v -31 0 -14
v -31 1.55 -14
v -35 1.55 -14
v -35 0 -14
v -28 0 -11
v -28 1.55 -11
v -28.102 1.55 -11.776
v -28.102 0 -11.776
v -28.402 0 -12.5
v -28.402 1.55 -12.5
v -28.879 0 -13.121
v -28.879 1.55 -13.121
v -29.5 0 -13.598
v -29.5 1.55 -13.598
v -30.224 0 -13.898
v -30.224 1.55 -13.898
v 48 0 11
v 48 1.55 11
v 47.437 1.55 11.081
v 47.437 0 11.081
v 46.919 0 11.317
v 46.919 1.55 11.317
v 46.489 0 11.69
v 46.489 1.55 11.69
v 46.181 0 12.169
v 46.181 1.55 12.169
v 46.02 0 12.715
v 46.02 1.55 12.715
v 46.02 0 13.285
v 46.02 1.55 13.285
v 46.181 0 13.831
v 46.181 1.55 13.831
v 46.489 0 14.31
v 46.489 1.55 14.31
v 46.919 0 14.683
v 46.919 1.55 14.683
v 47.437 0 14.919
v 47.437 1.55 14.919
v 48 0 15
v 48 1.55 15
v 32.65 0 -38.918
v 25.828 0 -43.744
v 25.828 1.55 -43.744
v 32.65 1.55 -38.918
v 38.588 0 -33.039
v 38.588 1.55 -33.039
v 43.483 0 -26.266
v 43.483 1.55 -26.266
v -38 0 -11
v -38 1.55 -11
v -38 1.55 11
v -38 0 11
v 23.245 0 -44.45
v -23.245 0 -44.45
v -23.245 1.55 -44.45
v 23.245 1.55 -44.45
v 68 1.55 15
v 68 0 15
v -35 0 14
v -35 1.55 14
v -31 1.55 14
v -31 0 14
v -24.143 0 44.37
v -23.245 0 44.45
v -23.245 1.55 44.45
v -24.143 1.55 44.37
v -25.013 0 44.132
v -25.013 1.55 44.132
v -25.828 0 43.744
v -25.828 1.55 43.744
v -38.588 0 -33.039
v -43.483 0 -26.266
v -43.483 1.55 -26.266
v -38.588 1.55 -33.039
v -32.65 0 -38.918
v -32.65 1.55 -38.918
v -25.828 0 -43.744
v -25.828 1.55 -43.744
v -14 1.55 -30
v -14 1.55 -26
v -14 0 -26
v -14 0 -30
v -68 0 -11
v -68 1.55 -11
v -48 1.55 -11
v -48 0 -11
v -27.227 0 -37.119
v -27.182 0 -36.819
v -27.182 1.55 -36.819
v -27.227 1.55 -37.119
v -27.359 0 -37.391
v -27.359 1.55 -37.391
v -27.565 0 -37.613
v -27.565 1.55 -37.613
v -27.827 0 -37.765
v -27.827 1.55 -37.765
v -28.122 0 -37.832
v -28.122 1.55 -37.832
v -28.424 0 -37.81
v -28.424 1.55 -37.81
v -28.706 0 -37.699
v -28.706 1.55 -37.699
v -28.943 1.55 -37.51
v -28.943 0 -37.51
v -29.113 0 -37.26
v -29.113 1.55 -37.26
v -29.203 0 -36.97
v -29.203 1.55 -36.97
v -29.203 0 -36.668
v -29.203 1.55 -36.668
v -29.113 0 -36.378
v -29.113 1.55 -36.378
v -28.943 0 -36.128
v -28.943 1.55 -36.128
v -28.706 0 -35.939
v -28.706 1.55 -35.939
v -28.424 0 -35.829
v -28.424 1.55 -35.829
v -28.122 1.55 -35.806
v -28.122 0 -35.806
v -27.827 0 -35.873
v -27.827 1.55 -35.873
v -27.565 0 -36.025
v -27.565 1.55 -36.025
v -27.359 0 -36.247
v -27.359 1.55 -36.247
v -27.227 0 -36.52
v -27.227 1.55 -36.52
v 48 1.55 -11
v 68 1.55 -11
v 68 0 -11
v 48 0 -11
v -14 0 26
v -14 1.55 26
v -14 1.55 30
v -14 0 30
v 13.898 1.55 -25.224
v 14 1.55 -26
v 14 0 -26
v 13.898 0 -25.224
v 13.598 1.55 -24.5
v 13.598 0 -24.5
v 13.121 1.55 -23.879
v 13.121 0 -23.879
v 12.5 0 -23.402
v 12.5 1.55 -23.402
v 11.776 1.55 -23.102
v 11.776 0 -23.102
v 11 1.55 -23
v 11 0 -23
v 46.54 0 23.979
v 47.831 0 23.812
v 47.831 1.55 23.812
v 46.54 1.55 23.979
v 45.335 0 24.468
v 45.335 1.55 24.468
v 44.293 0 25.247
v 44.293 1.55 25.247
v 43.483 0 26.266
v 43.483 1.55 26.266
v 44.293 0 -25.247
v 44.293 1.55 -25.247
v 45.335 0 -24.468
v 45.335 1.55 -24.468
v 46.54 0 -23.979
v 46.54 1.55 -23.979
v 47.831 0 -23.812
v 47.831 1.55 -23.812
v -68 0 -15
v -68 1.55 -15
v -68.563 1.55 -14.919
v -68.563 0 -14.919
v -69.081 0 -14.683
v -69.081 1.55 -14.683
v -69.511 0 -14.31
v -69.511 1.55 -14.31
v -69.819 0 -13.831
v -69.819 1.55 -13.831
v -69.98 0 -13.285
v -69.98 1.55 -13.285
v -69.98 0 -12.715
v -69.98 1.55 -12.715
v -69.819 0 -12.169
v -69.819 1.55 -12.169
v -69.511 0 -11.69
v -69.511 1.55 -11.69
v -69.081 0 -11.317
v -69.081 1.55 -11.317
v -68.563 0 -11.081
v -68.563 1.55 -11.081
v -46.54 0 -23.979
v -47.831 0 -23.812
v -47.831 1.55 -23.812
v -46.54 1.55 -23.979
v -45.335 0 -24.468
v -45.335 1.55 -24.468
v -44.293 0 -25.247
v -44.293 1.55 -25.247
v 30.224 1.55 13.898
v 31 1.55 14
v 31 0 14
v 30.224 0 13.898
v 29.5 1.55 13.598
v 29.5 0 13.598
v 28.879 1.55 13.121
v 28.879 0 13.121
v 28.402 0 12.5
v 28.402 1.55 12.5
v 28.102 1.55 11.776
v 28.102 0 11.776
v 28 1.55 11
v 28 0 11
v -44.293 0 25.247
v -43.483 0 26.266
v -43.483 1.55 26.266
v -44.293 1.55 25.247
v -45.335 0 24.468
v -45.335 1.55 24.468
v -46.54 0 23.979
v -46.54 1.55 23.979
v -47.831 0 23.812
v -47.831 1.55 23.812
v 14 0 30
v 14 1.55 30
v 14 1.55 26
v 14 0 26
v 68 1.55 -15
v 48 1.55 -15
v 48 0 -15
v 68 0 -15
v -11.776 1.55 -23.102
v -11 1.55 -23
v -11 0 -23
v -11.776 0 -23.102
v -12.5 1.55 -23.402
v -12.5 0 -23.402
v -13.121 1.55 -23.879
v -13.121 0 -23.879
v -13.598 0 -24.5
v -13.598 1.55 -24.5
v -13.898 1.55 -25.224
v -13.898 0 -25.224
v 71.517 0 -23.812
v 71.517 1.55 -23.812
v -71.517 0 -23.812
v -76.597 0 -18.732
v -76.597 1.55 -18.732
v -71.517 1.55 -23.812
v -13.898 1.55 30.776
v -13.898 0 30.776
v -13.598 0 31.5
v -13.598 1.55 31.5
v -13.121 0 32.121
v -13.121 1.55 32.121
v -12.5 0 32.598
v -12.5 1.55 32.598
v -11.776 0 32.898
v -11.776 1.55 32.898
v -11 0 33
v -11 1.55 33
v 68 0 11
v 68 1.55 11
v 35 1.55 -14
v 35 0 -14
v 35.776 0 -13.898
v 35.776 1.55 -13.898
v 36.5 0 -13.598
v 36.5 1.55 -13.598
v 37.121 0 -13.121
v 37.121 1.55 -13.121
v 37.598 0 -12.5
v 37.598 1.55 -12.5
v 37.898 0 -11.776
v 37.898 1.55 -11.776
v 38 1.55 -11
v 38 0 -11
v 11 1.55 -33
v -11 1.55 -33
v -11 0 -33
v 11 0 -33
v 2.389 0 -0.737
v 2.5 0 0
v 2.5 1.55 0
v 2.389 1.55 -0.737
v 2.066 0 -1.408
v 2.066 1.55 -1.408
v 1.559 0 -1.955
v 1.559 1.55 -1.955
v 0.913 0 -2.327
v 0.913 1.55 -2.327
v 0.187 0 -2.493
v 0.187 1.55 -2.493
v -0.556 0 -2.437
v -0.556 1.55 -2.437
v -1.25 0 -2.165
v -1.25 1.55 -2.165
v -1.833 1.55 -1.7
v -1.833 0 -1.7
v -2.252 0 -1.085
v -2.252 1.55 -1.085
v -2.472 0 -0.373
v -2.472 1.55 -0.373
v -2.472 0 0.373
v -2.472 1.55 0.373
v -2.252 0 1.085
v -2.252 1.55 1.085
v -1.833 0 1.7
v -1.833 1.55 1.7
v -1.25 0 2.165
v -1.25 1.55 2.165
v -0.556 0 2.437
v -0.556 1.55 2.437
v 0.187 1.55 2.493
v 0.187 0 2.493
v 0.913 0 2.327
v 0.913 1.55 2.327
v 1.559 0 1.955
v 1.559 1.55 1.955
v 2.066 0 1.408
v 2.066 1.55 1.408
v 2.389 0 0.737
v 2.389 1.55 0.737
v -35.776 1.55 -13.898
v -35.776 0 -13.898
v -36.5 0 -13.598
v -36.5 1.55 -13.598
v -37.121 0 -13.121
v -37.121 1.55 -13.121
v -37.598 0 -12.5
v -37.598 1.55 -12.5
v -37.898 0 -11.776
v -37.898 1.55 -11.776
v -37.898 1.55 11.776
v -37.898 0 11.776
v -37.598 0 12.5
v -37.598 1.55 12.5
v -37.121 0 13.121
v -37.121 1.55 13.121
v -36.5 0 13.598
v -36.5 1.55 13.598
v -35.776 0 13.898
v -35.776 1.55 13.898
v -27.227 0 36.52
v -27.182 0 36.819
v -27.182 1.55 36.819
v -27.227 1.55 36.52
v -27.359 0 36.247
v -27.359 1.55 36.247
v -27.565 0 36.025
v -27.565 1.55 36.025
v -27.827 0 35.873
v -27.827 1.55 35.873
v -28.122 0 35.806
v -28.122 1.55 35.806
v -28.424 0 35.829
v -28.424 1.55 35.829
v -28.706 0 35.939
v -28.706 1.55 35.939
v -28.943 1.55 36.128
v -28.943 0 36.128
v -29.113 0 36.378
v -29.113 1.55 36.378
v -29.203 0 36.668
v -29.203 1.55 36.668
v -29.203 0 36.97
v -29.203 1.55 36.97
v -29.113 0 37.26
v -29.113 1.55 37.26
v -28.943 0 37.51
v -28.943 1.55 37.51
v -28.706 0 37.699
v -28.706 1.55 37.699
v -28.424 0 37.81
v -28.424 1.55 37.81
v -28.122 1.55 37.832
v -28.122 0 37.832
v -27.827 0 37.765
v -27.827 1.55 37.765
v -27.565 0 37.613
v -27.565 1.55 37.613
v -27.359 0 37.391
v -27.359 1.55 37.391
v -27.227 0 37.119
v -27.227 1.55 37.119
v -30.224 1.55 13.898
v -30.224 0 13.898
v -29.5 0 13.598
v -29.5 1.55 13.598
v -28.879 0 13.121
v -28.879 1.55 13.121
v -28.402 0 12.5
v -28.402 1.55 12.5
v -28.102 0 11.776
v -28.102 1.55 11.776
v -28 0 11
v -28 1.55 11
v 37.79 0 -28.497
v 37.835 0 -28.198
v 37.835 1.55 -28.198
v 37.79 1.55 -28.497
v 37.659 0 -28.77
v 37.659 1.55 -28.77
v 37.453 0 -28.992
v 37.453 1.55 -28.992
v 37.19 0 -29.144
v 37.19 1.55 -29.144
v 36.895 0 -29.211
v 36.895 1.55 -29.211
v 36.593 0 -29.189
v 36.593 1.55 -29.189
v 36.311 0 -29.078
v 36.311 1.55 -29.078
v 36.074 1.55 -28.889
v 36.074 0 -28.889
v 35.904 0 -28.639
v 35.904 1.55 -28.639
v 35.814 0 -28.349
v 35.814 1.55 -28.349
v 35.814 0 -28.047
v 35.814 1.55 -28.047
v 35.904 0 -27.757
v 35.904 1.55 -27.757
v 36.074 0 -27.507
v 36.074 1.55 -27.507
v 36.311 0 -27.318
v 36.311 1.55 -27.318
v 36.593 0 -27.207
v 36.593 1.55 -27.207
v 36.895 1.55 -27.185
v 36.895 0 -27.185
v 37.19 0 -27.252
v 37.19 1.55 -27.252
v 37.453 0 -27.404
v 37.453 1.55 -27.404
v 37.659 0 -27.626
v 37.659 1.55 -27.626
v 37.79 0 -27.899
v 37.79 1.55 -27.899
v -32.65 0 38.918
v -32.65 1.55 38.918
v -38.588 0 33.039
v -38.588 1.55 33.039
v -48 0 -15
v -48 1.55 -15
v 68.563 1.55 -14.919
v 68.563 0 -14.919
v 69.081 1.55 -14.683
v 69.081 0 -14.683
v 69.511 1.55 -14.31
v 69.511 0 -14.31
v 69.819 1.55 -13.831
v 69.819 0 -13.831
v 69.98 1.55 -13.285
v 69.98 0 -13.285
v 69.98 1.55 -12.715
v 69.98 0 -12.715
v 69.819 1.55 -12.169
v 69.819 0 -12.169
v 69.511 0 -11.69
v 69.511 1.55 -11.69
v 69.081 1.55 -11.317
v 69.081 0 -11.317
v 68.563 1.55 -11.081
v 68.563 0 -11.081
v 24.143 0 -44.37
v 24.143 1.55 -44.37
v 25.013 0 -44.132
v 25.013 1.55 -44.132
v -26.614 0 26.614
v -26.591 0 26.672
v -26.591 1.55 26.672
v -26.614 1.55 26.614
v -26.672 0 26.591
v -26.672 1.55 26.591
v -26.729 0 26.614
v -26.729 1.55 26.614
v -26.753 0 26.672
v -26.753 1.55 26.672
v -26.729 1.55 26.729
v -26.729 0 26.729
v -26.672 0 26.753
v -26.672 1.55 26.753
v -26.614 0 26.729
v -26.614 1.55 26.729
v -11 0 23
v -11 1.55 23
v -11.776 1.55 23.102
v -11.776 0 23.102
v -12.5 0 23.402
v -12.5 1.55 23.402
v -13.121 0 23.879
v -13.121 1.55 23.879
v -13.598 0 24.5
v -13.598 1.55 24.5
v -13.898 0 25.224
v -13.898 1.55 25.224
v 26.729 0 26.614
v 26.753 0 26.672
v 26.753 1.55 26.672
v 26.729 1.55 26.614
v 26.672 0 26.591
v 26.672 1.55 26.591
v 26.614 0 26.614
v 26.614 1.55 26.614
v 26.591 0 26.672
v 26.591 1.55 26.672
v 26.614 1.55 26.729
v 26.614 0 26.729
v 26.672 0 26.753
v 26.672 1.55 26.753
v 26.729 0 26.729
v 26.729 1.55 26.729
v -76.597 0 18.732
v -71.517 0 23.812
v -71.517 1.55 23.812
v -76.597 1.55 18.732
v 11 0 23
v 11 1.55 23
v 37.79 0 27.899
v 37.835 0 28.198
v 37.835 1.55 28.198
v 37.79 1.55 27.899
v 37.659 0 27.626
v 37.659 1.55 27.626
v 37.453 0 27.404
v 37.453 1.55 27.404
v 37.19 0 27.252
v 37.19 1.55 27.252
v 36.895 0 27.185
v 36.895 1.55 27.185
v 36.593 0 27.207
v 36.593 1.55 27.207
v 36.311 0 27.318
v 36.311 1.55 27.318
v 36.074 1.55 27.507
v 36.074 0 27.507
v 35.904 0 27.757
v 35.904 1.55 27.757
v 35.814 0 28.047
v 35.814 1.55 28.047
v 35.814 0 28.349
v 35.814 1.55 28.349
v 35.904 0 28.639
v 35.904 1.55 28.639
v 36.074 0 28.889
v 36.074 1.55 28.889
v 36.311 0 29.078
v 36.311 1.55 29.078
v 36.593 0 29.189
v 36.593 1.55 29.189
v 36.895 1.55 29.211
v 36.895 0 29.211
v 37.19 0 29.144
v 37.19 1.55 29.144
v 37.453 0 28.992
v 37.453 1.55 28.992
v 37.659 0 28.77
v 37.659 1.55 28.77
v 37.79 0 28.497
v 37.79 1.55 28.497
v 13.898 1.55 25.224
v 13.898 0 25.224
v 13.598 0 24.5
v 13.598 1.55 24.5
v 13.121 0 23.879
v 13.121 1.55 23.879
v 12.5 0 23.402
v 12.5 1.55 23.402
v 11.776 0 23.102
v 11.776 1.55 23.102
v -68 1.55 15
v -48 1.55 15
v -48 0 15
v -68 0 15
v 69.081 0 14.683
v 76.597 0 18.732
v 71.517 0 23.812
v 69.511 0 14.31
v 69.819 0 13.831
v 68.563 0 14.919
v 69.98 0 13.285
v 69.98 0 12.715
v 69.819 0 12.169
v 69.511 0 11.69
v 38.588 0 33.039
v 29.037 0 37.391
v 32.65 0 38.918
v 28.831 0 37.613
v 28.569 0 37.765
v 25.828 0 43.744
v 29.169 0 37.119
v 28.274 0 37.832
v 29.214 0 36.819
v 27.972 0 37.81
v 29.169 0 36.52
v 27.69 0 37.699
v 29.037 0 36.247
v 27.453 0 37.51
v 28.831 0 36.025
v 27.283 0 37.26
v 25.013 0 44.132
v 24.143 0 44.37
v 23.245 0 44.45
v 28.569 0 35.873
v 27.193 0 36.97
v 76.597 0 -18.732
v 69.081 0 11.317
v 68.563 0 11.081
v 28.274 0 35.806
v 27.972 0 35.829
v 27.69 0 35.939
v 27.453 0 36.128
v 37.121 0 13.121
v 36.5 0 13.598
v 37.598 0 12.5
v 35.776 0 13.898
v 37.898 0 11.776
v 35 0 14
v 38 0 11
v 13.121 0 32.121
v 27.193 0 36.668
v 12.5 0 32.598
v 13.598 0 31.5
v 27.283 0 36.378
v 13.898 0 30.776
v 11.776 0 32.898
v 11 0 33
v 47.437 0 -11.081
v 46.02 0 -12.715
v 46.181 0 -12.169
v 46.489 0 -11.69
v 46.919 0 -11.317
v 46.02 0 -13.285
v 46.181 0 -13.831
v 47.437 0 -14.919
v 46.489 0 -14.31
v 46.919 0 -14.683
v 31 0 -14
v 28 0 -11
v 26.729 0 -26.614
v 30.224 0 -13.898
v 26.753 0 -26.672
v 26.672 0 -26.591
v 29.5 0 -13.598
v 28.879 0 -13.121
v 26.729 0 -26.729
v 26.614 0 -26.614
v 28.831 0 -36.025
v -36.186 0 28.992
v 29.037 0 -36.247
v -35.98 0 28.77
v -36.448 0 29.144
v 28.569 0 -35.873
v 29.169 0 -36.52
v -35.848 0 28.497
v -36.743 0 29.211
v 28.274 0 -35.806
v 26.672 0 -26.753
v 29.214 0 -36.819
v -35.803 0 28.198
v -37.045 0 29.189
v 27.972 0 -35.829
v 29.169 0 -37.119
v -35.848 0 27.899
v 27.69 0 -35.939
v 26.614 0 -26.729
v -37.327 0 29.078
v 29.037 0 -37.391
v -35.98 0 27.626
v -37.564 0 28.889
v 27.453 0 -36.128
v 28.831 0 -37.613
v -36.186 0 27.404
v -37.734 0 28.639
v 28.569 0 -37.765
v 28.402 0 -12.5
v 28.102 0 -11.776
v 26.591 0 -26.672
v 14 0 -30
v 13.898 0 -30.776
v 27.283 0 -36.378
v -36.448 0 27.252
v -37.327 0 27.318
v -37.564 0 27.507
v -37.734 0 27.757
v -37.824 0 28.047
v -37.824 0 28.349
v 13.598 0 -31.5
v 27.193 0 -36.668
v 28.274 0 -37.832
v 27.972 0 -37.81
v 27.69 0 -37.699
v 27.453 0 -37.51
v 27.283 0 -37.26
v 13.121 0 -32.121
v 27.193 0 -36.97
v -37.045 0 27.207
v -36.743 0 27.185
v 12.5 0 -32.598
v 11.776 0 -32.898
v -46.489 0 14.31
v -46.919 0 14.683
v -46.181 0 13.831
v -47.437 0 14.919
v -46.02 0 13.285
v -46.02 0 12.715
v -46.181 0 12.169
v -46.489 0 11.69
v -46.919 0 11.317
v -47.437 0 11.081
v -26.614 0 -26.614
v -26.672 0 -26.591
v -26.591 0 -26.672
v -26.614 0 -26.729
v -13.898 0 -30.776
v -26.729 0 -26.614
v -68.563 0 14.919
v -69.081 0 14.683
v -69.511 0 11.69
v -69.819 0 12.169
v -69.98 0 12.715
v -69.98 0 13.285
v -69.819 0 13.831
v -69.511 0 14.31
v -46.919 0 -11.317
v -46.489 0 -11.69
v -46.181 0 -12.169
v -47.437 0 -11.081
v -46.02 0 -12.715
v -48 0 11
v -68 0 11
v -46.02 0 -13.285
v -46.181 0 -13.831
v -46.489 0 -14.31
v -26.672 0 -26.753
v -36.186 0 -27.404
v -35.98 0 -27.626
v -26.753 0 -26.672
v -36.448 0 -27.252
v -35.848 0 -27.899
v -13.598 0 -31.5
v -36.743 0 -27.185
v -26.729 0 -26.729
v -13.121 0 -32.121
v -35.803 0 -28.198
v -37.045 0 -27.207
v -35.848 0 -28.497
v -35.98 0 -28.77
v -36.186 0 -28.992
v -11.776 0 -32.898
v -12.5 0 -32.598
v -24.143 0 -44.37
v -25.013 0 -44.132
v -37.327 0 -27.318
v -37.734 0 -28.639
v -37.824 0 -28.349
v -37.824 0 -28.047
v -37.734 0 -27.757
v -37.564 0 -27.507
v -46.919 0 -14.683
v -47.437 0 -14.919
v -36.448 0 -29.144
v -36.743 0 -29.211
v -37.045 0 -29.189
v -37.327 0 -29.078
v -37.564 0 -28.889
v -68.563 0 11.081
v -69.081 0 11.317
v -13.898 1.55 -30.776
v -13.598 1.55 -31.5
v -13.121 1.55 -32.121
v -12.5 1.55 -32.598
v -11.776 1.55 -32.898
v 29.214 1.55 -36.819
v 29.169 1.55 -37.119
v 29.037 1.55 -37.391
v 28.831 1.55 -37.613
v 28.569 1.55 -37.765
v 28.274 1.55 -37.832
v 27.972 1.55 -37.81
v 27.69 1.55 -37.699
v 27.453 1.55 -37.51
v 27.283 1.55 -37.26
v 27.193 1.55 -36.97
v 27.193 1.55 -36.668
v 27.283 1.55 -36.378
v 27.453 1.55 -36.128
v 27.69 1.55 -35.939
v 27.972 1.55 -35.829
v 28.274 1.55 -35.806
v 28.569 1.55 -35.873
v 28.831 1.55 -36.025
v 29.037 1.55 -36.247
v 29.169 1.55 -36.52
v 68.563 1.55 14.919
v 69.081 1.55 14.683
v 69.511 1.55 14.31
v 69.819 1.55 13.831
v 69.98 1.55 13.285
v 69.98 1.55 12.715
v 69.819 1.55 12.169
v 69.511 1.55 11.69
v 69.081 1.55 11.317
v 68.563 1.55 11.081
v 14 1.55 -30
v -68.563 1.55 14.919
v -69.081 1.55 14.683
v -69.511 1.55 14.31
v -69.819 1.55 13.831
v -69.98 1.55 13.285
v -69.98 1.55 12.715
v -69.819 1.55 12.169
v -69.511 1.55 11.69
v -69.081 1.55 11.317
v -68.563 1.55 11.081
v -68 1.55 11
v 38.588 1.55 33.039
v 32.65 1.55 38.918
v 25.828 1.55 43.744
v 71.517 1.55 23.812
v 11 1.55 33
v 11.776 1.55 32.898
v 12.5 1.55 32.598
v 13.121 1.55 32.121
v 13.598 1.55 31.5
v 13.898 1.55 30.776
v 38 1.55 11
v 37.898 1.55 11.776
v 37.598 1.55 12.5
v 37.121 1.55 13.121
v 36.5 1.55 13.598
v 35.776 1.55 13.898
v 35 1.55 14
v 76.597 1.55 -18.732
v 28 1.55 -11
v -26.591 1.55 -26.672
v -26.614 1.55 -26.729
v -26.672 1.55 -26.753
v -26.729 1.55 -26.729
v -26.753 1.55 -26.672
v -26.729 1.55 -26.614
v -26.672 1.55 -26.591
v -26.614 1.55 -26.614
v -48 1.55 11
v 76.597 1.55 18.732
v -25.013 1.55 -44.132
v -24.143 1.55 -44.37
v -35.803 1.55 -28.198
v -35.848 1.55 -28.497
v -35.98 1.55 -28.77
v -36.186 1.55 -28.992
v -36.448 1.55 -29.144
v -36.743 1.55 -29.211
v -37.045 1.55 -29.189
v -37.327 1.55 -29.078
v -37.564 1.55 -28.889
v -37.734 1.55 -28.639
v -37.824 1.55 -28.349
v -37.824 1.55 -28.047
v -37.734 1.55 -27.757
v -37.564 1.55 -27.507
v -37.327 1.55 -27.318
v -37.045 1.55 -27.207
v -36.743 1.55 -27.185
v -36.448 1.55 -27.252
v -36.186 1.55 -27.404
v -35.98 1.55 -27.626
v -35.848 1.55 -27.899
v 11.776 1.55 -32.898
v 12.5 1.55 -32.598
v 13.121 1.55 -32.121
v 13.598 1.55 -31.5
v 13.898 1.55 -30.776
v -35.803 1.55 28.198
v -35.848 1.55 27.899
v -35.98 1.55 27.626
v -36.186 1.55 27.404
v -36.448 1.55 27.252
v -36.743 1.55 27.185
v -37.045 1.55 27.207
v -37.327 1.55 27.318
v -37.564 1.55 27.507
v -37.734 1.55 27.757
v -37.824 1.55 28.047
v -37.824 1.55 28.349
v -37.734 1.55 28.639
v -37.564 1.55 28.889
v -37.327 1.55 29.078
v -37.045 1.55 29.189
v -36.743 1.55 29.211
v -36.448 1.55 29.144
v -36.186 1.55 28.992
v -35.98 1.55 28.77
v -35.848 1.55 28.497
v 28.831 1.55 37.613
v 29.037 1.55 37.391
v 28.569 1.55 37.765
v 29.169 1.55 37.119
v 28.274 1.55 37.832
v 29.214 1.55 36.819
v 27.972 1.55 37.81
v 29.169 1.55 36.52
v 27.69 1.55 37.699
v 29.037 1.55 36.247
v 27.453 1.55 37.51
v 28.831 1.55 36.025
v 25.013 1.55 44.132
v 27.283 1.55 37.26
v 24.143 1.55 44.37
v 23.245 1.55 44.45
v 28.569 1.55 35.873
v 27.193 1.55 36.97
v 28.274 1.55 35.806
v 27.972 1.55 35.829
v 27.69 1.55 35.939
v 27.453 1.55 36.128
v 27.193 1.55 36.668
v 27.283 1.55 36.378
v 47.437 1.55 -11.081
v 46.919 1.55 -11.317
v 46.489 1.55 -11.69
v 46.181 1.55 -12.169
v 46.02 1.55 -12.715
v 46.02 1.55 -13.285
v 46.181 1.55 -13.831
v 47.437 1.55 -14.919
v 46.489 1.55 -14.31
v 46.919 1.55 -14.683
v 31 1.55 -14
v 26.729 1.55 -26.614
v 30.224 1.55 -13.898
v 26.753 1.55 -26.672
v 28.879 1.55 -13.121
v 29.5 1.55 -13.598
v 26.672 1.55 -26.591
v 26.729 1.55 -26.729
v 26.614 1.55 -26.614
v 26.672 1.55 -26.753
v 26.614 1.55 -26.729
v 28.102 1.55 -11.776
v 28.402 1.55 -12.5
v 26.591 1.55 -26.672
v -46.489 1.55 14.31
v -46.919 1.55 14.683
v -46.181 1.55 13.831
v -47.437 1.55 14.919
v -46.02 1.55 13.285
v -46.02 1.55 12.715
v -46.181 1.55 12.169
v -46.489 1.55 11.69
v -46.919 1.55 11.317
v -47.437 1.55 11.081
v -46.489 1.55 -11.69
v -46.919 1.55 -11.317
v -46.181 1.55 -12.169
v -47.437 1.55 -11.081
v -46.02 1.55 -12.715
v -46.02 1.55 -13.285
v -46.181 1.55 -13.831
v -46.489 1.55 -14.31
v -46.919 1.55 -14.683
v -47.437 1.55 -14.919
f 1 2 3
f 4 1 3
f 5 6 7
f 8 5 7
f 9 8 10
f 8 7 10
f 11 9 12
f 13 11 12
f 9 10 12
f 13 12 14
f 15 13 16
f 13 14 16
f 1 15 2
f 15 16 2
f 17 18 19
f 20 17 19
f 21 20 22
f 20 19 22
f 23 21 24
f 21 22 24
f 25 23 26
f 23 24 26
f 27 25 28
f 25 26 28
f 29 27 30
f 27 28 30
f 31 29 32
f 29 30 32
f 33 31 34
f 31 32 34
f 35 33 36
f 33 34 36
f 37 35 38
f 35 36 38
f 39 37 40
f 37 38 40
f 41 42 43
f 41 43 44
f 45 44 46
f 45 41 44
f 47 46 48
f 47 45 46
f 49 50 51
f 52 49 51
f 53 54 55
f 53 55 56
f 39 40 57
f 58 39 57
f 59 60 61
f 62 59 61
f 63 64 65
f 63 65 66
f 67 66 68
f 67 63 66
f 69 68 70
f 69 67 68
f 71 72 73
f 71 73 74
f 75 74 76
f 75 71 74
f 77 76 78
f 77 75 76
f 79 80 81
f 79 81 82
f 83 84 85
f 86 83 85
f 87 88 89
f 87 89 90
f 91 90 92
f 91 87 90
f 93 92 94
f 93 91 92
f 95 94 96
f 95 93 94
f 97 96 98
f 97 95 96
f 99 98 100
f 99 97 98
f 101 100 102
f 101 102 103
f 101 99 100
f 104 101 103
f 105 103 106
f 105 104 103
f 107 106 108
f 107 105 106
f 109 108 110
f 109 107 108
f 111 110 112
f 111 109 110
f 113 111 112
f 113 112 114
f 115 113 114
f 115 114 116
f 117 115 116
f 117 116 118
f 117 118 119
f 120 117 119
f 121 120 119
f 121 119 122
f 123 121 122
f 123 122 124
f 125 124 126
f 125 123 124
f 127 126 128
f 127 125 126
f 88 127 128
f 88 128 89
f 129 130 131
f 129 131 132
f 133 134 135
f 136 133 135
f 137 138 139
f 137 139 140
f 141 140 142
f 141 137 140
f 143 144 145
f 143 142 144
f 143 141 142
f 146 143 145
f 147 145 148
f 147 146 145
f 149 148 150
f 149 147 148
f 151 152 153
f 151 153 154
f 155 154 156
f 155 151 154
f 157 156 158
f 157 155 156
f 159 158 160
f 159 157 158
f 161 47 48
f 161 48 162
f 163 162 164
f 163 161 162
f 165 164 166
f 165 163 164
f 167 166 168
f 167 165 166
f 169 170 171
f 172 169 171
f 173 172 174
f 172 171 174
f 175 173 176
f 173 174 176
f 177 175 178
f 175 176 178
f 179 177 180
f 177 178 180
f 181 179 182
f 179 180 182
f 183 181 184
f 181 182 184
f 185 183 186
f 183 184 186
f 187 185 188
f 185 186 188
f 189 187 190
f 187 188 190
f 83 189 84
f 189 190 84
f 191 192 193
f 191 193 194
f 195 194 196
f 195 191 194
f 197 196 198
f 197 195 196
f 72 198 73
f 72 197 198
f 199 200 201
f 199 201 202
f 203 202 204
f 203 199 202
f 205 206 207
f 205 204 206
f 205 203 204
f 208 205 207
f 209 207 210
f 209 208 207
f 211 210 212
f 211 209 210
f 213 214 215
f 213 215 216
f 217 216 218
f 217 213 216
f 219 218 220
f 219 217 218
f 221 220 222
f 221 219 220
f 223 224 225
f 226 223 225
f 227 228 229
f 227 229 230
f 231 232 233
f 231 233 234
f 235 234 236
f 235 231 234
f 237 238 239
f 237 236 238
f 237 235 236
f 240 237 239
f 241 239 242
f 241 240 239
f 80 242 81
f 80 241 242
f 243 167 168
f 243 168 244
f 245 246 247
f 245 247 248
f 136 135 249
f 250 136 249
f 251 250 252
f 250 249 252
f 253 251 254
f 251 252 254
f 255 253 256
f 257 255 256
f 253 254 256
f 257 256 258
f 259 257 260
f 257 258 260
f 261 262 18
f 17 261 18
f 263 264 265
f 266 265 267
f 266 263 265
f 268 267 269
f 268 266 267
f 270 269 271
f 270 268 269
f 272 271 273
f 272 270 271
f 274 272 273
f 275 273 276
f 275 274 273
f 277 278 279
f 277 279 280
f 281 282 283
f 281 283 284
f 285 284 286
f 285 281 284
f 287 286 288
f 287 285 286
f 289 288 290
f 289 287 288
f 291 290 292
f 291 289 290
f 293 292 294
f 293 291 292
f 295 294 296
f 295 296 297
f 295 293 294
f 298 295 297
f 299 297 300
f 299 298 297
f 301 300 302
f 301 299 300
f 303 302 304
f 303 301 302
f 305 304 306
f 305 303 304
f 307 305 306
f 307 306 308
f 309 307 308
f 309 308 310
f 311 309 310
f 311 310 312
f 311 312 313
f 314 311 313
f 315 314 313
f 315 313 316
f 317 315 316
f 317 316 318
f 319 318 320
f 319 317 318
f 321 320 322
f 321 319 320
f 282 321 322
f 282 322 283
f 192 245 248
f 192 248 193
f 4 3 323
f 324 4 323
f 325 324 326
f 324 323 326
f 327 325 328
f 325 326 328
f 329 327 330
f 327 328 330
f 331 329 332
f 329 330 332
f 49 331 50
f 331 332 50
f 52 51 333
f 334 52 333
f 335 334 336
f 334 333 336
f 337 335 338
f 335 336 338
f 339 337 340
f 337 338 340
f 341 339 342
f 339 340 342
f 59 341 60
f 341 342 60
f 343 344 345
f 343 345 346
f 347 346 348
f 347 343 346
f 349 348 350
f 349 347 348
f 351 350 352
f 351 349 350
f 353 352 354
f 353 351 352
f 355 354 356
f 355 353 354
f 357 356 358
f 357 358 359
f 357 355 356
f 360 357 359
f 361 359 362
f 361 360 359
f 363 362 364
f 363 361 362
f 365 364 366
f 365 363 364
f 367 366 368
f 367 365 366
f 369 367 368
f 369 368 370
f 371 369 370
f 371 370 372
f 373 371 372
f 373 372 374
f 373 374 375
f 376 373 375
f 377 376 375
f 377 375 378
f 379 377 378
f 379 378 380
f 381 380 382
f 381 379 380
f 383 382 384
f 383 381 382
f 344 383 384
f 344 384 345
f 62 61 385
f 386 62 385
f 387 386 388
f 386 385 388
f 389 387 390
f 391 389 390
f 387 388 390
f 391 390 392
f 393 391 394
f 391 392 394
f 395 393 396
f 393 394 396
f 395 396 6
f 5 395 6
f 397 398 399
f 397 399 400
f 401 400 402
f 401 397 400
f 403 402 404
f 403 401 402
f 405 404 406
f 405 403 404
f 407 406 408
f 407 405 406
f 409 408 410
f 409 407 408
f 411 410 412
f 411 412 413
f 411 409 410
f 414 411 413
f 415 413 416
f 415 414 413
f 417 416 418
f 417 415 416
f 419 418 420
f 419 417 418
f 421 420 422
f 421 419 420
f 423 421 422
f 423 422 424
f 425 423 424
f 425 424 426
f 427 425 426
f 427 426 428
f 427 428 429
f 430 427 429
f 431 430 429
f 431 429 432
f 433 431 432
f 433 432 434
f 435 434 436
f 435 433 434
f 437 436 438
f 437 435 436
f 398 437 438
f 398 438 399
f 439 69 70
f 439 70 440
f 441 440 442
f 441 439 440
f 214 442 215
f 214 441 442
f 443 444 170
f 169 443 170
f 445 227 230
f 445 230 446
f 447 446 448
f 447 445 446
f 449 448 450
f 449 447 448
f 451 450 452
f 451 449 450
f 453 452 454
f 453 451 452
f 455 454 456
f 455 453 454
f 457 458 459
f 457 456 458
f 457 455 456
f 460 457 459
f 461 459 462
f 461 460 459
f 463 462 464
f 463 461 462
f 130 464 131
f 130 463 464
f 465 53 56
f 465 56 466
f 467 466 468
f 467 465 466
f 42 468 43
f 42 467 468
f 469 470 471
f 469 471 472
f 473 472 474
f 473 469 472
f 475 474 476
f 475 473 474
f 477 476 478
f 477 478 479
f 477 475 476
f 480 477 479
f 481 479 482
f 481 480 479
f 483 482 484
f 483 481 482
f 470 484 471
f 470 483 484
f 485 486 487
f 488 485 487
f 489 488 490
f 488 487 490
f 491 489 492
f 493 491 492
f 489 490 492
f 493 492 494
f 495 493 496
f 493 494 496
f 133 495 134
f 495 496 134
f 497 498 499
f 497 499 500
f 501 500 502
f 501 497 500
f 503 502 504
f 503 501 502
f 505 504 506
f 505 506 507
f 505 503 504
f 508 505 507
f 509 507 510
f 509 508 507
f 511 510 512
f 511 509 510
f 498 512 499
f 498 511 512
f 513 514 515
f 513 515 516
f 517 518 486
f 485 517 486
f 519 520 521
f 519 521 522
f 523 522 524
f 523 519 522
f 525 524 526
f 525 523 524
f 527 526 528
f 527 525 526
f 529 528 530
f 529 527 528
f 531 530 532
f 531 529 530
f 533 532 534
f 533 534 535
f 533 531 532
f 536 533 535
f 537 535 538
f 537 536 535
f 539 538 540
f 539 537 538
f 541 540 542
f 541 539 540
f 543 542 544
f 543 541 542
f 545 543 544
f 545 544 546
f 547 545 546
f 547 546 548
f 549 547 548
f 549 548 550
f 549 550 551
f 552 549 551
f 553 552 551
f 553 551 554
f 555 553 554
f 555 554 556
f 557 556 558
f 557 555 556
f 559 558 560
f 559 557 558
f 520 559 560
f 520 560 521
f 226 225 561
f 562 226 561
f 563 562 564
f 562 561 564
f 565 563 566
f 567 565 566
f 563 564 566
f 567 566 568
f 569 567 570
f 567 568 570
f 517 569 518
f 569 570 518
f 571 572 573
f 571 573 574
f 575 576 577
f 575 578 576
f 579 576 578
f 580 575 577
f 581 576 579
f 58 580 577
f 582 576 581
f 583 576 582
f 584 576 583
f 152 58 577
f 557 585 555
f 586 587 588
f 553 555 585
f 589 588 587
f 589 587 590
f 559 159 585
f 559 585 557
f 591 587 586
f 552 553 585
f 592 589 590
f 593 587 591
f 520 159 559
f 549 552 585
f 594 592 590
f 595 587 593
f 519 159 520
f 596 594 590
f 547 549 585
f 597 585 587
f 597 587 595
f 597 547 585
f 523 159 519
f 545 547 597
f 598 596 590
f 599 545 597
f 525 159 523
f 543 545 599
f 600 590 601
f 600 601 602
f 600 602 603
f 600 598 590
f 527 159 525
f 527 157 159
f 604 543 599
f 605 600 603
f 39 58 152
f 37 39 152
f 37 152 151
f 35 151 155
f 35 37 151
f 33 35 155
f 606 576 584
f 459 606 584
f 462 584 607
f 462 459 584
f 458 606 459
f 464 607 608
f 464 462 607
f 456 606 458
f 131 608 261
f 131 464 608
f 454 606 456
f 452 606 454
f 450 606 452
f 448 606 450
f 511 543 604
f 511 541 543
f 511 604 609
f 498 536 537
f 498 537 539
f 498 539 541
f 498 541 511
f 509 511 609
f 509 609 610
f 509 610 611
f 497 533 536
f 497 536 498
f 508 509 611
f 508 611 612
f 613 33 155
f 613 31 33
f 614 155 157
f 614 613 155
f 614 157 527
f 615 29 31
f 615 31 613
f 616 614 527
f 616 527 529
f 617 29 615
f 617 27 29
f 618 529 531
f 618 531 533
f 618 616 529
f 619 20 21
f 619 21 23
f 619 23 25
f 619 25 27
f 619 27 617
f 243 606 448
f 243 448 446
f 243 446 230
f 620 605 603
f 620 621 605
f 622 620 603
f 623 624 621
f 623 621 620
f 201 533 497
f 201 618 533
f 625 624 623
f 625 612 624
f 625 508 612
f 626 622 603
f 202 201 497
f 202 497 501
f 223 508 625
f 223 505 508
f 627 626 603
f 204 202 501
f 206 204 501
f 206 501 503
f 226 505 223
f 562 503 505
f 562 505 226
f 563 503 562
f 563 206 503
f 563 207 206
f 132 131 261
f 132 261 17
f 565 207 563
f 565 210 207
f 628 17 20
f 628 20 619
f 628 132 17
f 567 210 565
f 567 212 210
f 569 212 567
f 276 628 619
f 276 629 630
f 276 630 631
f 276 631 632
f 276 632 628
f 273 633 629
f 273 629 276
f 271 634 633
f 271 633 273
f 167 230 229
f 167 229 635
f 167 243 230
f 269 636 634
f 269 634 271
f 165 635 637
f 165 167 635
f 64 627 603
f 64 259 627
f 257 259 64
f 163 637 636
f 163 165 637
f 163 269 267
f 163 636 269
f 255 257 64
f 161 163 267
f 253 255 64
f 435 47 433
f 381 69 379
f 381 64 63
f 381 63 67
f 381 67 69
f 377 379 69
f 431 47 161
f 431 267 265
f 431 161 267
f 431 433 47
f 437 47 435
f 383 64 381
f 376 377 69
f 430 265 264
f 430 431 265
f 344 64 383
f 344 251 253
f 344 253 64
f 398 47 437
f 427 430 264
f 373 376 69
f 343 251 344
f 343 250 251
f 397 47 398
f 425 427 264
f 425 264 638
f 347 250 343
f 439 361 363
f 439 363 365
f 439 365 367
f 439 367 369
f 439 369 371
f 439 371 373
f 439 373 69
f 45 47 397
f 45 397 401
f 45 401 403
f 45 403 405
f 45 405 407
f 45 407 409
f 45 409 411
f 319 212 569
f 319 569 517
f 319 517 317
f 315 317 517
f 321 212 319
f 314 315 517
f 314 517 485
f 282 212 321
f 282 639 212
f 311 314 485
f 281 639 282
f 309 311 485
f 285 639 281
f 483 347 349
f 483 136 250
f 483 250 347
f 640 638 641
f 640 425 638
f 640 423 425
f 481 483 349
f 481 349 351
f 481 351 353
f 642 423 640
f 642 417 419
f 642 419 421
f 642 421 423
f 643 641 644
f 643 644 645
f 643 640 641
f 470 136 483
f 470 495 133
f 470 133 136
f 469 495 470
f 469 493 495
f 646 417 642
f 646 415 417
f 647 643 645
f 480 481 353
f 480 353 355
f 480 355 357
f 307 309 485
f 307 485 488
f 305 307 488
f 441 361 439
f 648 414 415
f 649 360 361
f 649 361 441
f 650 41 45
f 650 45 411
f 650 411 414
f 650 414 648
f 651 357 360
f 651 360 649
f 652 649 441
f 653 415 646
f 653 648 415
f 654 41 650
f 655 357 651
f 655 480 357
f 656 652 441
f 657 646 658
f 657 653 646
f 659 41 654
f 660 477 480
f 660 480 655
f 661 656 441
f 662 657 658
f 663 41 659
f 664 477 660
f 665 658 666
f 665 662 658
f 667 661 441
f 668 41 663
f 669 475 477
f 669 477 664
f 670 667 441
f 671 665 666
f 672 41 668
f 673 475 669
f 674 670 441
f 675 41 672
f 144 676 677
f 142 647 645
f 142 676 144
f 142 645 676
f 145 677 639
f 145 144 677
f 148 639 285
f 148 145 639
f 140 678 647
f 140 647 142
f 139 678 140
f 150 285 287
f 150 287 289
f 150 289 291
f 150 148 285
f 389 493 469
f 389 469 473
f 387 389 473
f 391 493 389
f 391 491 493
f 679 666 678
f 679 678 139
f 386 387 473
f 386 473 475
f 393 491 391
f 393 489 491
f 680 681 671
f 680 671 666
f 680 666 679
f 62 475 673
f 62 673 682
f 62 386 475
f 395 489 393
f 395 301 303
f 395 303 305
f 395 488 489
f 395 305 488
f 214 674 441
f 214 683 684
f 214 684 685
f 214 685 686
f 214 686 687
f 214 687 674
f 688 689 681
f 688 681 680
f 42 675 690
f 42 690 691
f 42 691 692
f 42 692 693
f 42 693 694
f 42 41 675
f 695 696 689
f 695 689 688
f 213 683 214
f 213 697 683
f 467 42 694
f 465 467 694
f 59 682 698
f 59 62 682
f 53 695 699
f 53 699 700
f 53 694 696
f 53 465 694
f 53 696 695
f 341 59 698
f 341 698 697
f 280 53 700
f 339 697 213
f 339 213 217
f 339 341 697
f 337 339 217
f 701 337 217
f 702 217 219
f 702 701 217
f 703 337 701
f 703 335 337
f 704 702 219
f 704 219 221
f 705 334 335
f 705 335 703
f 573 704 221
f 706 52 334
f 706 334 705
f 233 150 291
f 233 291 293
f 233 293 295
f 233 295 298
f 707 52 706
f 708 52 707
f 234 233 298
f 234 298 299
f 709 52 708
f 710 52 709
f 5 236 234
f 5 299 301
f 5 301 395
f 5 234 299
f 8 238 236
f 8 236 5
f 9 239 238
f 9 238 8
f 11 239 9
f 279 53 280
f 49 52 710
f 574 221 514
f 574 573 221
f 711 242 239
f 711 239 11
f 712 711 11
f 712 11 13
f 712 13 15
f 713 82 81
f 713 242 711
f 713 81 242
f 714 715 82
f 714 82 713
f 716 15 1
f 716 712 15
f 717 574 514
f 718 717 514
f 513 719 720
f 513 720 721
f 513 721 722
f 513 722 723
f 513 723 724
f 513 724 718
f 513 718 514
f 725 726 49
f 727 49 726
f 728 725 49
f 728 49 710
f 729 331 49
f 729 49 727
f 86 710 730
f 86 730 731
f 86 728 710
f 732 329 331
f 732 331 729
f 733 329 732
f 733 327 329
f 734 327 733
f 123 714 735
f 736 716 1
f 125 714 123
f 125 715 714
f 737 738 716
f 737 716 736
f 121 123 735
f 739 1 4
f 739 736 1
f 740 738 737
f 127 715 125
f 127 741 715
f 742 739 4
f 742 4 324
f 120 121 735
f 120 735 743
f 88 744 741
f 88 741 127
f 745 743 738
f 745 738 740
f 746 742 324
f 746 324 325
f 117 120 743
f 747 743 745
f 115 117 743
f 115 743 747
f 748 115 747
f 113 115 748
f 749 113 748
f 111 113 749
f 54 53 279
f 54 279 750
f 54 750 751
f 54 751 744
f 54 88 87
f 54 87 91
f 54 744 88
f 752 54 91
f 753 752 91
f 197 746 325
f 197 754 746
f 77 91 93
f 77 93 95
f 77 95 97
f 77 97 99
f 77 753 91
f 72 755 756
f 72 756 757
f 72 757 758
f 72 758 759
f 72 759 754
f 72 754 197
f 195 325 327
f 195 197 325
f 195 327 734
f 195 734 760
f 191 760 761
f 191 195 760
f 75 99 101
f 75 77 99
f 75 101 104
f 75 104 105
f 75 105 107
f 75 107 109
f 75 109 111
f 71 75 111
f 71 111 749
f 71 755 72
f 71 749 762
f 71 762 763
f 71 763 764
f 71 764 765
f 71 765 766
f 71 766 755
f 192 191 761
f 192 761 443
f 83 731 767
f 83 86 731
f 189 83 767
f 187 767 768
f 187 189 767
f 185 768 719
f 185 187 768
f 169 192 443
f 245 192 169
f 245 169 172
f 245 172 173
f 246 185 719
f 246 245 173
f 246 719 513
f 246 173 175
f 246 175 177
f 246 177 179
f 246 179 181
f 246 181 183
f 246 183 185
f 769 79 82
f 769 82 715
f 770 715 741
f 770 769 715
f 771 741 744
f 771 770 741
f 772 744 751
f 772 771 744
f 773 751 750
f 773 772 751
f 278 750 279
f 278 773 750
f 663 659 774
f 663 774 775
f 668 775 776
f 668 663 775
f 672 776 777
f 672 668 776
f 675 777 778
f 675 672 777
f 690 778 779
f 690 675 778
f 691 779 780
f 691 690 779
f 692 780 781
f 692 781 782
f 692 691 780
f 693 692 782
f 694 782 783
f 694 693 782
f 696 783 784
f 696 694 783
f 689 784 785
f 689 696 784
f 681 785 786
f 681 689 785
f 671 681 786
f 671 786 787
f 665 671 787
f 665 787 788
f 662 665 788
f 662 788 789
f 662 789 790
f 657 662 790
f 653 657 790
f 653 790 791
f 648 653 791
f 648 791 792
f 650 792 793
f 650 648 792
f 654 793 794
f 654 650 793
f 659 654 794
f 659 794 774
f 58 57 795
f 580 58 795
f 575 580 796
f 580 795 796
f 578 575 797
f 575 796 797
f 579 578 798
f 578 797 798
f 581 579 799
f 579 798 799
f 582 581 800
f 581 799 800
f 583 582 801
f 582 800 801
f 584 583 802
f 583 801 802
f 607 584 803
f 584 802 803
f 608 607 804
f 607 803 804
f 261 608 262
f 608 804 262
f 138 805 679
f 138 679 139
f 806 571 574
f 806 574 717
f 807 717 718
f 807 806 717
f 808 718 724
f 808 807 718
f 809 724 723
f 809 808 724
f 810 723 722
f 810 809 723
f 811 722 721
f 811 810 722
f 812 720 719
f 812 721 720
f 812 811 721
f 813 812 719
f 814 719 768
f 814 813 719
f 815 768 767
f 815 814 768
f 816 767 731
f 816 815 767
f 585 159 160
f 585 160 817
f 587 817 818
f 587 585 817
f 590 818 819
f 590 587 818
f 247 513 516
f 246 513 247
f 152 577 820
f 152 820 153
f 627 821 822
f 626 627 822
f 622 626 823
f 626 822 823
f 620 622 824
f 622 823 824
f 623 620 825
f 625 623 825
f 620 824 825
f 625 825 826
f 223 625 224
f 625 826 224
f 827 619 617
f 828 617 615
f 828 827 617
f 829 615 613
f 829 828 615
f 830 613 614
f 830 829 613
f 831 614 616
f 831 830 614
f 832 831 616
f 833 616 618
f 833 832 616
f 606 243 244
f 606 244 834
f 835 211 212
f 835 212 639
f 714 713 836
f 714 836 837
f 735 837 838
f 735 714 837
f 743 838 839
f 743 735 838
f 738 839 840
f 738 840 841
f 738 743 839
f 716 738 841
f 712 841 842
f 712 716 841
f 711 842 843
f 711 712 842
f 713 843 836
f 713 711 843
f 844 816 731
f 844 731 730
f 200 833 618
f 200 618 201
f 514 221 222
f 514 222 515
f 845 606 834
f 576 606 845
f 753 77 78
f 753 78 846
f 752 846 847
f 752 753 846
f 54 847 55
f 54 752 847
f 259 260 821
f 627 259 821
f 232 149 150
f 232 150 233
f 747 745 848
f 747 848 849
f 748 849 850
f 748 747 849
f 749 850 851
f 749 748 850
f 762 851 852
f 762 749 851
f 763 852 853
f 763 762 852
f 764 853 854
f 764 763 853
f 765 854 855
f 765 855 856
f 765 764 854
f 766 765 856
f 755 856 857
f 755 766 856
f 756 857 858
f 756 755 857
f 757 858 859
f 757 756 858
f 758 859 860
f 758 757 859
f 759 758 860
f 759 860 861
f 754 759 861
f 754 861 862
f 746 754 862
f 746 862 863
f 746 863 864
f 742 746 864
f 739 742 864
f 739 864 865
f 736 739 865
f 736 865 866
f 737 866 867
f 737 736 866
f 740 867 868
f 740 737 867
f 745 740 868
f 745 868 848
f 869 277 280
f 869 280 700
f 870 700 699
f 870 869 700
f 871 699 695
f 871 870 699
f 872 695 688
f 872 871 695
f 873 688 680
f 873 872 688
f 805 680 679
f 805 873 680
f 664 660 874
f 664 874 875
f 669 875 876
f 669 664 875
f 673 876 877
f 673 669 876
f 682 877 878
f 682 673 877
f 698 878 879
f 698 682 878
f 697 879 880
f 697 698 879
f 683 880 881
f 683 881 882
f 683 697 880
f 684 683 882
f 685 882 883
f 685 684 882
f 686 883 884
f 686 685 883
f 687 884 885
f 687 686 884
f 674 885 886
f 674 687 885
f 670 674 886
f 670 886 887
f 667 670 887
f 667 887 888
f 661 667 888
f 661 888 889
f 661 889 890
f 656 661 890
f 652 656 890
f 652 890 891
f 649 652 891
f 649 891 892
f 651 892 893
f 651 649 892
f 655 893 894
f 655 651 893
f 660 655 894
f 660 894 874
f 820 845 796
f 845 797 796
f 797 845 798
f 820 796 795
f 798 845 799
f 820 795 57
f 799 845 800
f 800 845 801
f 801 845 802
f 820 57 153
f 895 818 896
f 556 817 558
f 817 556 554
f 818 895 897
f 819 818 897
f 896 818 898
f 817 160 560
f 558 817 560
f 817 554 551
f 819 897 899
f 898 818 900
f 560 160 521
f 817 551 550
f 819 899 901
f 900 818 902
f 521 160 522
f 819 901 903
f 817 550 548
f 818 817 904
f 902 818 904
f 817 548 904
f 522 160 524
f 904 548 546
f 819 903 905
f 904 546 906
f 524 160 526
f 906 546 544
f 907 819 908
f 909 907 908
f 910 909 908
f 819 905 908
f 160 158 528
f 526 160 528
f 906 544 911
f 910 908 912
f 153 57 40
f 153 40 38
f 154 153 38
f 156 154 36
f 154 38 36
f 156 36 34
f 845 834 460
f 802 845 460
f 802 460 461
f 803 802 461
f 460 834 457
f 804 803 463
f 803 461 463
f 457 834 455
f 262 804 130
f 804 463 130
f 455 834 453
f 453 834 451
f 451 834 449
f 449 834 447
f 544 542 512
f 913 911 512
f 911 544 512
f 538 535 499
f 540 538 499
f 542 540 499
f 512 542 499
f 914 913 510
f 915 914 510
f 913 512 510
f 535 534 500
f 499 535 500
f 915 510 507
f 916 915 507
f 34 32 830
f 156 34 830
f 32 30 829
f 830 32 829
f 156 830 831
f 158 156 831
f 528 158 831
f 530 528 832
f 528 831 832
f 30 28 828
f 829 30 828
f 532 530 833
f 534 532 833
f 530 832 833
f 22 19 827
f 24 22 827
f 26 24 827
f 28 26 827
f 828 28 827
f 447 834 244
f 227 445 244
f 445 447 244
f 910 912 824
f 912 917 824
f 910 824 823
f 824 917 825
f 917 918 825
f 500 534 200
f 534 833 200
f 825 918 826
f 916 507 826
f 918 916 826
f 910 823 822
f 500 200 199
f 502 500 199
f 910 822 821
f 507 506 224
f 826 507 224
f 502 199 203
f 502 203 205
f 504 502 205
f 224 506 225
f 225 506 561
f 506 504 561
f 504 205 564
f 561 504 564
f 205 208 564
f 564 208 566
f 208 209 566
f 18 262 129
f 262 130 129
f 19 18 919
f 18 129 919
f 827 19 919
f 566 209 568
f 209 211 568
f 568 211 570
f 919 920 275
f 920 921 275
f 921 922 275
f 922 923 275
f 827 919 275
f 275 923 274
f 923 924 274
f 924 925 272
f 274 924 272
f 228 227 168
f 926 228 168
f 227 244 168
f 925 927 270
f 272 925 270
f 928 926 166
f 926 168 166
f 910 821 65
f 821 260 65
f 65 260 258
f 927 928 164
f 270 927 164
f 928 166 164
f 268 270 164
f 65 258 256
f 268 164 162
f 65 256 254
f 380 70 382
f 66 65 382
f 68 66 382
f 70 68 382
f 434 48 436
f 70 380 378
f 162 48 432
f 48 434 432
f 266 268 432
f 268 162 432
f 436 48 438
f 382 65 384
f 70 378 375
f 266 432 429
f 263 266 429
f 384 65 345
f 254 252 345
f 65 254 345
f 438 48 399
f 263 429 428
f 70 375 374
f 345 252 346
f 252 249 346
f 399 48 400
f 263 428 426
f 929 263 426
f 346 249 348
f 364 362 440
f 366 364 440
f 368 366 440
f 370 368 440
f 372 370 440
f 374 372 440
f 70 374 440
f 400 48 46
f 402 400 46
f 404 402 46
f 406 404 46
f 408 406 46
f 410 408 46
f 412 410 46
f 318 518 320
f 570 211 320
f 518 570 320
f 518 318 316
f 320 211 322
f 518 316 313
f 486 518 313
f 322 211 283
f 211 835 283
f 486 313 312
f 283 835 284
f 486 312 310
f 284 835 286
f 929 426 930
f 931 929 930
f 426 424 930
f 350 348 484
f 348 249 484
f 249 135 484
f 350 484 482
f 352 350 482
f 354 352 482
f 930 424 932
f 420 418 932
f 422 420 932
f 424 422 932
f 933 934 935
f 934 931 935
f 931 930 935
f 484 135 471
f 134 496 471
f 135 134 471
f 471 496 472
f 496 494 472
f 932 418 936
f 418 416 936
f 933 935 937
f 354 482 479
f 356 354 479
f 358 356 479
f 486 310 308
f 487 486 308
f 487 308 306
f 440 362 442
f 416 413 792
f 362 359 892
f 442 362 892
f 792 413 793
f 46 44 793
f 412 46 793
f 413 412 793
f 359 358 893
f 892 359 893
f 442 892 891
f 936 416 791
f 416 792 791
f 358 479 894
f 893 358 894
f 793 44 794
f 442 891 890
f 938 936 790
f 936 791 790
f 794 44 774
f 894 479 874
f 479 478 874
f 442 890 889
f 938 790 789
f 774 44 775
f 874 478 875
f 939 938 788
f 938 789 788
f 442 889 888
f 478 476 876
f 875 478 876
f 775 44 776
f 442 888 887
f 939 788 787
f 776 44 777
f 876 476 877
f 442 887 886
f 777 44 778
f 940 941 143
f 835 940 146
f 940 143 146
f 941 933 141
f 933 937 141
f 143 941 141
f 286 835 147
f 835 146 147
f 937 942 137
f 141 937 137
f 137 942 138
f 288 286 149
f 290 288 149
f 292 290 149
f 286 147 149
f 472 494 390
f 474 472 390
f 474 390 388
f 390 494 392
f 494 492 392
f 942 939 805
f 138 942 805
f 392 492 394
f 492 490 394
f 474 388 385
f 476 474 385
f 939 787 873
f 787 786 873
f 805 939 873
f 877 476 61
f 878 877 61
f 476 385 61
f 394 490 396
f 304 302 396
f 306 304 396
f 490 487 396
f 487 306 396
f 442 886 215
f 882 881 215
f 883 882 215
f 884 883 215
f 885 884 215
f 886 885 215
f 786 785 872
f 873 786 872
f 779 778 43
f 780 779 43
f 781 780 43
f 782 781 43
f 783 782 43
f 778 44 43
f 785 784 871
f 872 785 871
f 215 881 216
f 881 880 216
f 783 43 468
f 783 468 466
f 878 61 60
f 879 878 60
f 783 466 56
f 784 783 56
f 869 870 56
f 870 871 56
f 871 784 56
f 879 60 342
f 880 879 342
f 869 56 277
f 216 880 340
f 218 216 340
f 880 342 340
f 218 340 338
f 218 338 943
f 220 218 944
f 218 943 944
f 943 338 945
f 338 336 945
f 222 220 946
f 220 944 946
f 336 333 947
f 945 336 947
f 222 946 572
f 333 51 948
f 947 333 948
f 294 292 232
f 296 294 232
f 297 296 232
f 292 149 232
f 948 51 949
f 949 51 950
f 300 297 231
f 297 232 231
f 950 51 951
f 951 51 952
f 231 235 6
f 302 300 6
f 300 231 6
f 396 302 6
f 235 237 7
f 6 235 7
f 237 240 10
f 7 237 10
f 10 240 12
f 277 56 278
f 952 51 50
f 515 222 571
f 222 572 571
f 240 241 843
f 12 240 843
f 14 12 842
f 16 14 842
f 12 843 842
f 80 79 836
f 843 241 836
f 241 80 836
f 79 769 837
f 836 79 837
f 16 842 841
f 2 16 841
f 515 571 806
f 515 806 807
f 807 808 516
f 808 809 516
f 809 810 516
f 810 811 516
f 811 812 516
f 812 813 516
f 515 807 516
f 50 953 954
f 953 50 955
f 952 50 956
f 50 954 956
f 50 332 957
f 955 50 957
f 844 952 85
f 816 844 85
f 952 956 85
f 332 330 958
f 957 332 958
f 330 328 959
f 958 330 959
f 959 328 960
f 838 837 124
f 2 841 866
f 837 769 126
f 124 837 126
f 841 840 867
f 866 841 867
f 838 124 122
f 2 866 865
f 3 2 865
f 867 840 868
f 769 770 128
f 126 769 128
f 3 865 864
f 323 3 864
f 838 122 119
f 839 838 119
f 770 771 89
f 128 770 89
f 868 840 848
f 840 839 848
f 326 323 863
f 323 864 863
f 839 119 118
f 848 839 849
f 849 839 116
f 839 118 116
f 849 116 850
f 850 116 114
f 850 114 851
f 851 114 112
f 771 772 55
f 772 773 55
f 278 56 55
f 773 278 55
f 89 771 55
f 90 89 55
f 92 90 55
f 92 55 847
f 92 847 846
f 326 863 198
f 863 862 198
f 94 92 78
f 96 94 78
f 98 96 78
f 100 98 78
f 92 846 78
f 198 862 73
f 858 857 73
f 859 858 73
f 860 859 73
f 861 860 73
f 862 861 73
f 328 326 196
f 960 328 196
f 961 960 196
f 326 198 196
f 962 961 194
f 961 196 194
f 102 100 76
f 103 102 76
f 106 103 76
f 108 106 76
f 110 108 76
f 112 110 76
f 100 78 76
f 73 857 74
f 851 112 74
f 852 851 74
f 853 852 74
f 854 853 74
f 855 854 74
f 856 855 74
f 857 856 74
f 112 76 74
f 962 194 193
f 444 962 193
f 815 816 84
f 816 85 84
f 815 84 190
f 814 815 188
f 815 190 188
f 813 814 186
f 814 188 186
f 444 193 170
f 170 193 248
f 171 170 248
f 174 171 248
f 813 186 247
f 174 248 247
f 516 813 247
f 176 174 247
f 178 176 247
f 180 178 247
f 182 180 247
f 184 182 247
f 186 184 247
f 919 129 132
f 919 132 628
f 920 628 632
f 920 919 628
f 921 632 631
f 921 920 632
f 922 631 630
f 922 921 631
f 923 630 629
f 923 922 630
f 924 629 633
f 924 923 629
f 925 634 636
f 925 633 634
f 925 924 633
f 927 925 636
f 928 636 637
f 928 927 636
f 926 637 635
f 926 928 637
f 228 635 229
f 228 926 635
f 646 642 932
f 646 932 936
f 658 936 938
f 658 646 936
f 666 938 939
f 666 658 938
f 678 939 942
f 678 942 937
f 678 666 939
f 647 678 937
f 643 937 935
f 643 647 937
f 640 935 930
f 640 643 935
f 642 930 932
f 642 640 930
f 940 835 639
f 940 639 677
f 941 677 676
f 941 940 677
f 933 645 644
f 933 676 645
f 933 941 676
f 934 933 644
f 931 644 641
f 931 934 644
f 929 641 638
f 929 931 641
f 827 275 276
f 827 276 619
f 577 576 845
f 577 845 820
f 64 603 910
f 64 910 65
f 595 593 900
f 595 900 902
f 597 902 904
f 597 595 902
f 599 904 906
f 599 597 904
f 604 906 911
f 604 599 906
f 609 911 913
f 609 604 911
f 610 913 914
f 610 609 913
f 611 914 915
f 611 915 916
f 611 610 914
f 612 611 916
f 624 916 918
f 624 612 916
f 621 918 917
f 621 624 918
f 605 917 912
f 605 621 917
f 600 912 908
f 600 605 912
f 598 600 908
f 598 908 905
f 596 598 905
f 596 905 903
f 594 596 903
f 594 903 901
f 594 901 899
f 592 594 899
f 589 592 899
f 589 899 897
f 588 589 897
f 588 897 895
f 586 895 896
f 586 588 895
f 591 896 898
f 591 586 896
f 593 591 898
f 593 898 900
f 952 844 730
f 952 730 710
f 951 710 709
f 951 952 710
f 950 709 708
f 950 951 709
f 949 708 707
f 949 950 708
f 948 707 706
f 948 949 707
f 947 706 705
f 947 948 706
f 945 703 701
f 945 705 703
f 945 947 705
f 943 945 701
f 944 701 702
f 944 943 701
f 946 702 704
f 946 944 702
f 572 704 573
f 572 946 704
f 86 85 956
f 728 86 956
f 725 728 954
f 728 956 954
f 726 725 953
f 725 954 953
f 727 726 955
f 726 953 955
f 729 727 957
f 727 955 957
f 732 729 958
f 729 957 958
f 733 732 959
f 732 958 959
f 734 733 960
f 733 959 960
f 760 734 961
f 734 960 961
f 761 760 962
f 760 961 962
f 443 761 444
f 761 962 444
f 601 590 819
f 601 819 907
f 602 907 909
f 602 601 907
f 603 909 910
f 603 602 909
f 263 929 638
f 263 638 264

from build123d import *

# Parameters (mm, degrees)
SKETCH1_R           = 2.5
SKETCH1_R_2         = 1.016
SKETCH1_R_3         = 0.080960088
BOSS_EXTRUDE1_DEPTH = 1.55
CUT_EXTRUDE1_DEPTH  = 2.55
CUT_EXTRUDE2_DEPTH  = 2.55


with BuildPart() as part:
    # Sketch1 → Boss-Extrude1 (new body)
    with BuildSketch(Plane(origin=(0, 0, 0), x_dir=(1, 0, 0), z_dir=(0, 1, 0))):
        with BuildLine():
            Line((-23.244816627, 44.45), (23.244816627, 44.45))
            ThreePointArc((23.244816627, 44.45), (24.583514169, 44.270437622), (25.827574029, 43.744444444))
            ThreePointArc((25.827574029, 43.744444444), (35.740062311, 36.101079569), (43.482663438, 26.265909091))
            ThreePointArc((43.482663438, 26.265909091), (45.334600658, 24.468164919), (47.830929781, 23.8125))
            Line((47.830929781, 23.8125), (71.516875, 23.8125))
            Line((71.516875, 23.8125), (76.596875, 18.7325))
            Line((76.596875, 18.7325), (76.596875, -18.7325))
            Line((76.596875, -18.7325), (71.516875, -23.8125))
            Line((71.516875, -23.8125), (47.830929781, -23.8125))
            ThreePointArc((47.830929781, -23.8125), (45.334600658, -24.468164919), (43.482663438, -26.265909091))
            ThreePointArc((43.482663438, -26.265909091), (35.740062311, -36.101079569), (25.827574029, -43.744444444))
            ThreePointArc((25.827574029, -43.744444444), (24.583514169, -44.270437622), (23.244816627, -44.45))
            Line((23.244816627, -44.45), (-23.244816627, -44.45))
            ThreePointArc((-23.244816627, -44.45), (-24.583514169, -44.270437622), (-25.827574029, -43.744444444))
            ThreePointArc((-25.827574029, -43.744444444), (-35.740062311, -36.101079569), (-43.482663438, -26.265909091))
            ThreePointArc((-43.482663438, -26.265909091), (-45.334600658, -24.468164919), (-47.830929781, -23.8125))
            Line((-47.830929781, -23.8125), (-71.516875, -23.8125))
            Line((-71.516875, -23.8125), (-76.596875, -18.7325))
            Line((-76.596875, -18.7325), (-76.596875, 18.7325))
            Line((-76.596875, 18.7325), (-71.516875, 23.8125))
            Line((-71.516875, 23.8125), (-47.830929781, 23.8125))
            ThreePointArc((-47.830929781, 23.8125), (-45.334600658, 24.468164919), (-43.482663438, 26.265909091))
            ThreePointArc((-43.482663438, 26.265909091), (-35.740062311, 36.101079569), (-25.827574029, 43.744444444))
            ThreePointArc((-25.827574029, 43.744444444), (-24.583514169, 44.270437622), (-23.244816627, 44.45))
        make_face()
        Circle(SKETCH1_R, mode=Mode.SUBTRACT)
        with Locations((36.819050096, 28.19800422)):
            Circle(SKETCH1_R_2, mode=Mode.SUBTRACT)
        with Locations((28.19800422, 36.819050096)):
            Circle(SKETCH1_R_2, mode=Mode.SUBTRACT)
        with Locations((26.671582547, 26.671582547)):
            Circle(SKETCH1_R_3, mode=Mode.SUBTRACT)
        with Locations((26.671582547, -26.671582547)):
            Circle(SKETCH1_R_3, mode=Mode.SUBTRACT)
        with Locations((36.819050096, -28.19800422)):
            Circle(SKETCH1_R_2, mode=Mode.SUBTRACT)
        with Locations((28.19800422, -36.819050096)):
            Circle(SKETCH1_R_2, mode=Mode.SUBTRACT)
        with Locations((-26.671582547, -26.671582547)):
            Circle(SKETCH1_R_3, mode=Mode.SUBTRACT)
        with Locations((-28.19800422, -36.819050096)):
            Circle(SKETCH1_R_2, mode=Mode.SUBTRACT)
        with Locations((-36.819050096, -28.19800422)):
            Circle(SKETCH1_R_2, mode=Mode.SUBTRACT)
        with Locations((-26.671582547, 26.671582547)):
            Circle(SKETCH1_R_3, mode=Mode.SUBTRACT)
        with Locations((-36.819050096, 28.19800422)):
            Circle(SKETCH1_R_2, mode=Mode.SUBTRACT)
        with Locations((-28.19800422, 36.819050096)):
            Circle(SKETCH1_R_2, mode=Mode.SUBTRACT)
    extrude(amount=BOSS_EXTRUDE1_DEPTH)

    # Sketch2 → Cut-Extrude1 (cut, through all)
    with BuildSketch(Plane(origin=(0, 1.55, 0), x_dir=(1, 0, 0), z_dir=(0, 1, 0))):
        with BuildLine():
            Line((48, 15), (68, 15))
            ThreePointArc((68, 15), (70, 13), (68, 11))
            Line((68, 11), (48, 11))
            ThreePointArc((48, 11), (46, 13), (48, 15))
        make_face()
        with BuildLine():
            Line((48, -15), (68, -15))
            ThreePointArc((68, -15), (70, -13), (68, -11))
            Line((68, -11), (48, -11))
            ThreePointArc((48, -11), (46, -13), (48, -15))
        make_face()
        with BuildLine():
            Line((-48, 15), (-68, 15))
            ThreePointArc((-68, 15), (-70, 13), (-68, 11))
            Line((-68, 11), (-48, 11))
            ThreePointArc((-48, 11), (-46, 13), (-48, 15))
        make_face()
        with BuildLine():
            Line((-48, -15), (-68, -15))
            ThreePointArc((-68, -15), (-70, -13), (-68, -11))
            Line((-68, -11), (-48, -11))
            ThreePointArc((-48, -11), (-46, -13), (-48, -15))
        make_face()
    extrude(amount=-CUT_EXTRUDE1_DEPTH, mode=Mode.SUBTRACT)

    # Sketch3 → Cut-Extrude2 (cut, through all)
    with BuildSketch(Plane(origin=(0, 1.55, 0), x_dir=(1, 0, 0), z_dir=(0, 1, 0))):
        with BuildLine():
            Line((-11, 33), (11, 33))
            ThreePointArc((11, 33), (13.121320344, 32.121320344), (14, 30))
            Line((14, 30), (14, 26))
            ThreePointArc((14, 26), (13.121320344, 23.878679656), (11, 23))
            Line((11, 23), (-11, 23))
            ThreePointArc((-11, 23), (-13.121320344, 23.878679656), (-14, 26))
            Line((-14, 26), (-14, 30))
            ThreePointArc((-14, 30), (-13.121320344, 32.121320344), (-11, 33))
        make_face()
        with BuildLine():
            Line((14, -30), (14, -26))
            ThreePointArc((14, -26), (13.121320344, -23.878679656), (11, -23))
            Line((11, -23), (-11, -23))
            ThreePointArc((-11, -23), (-13.121320344, -23.878679656), (-14, -26))
            Line((-14, -26), (-14, -30))
            ThreePointArc((-14, -30), (-13.121320344, -32.121320344), (-11, -33))
            Line((-11, -33), (11, -33))
            ThreePointArc((11, -33), (13.121320344, -32.121320344), (14, -30))
        make_face()
        with BuildLine():
            Line((31, 14), (35, 14))
            ThreePointArc((35, 14), (37.121320344, 13.121320344), (38, 11))
            Line((38, 11), (38, -11))
            ThreePointArc((38, -11), (37.121320344, -13.121320344), (35, -14))
            Line((35, -14), (31, -14))
            ThreePointArc((31, -14), (28.878679656, -13.121320344), (28, -11))
            Line((28, -11), (28, 11))
            ThreePointArc((28, 11), (28.878679656, 13.121320344), (31, 14))
        make_face()
        with BuildLine():
            Line((-38, 11), (-38, -11))
            ThreePointArc((-38, -11), (-37.121320344, -13.121320344), (-35, -14))
            Line((-35, -14), (-31, -14))
            ThreePointArc((-31, -14), (-28.878679656, -13.121320344), (-28, -11))
            Line((-28, -11), (-28, 11))
            ThreePointArc((-28, 11), (-28.878679656, 13.121320344), (-31, 14))
            Line((-31, 14), (-35, 14))
            ThreePointArc((-35, 14), (-37.121320344, 13.121320344), (-38, 11))
        make_face()
    extrude(amount=-CUT_EXTRUDE2_DEPTH, mode=Mode.SUBTRACT)


solid = part.part
